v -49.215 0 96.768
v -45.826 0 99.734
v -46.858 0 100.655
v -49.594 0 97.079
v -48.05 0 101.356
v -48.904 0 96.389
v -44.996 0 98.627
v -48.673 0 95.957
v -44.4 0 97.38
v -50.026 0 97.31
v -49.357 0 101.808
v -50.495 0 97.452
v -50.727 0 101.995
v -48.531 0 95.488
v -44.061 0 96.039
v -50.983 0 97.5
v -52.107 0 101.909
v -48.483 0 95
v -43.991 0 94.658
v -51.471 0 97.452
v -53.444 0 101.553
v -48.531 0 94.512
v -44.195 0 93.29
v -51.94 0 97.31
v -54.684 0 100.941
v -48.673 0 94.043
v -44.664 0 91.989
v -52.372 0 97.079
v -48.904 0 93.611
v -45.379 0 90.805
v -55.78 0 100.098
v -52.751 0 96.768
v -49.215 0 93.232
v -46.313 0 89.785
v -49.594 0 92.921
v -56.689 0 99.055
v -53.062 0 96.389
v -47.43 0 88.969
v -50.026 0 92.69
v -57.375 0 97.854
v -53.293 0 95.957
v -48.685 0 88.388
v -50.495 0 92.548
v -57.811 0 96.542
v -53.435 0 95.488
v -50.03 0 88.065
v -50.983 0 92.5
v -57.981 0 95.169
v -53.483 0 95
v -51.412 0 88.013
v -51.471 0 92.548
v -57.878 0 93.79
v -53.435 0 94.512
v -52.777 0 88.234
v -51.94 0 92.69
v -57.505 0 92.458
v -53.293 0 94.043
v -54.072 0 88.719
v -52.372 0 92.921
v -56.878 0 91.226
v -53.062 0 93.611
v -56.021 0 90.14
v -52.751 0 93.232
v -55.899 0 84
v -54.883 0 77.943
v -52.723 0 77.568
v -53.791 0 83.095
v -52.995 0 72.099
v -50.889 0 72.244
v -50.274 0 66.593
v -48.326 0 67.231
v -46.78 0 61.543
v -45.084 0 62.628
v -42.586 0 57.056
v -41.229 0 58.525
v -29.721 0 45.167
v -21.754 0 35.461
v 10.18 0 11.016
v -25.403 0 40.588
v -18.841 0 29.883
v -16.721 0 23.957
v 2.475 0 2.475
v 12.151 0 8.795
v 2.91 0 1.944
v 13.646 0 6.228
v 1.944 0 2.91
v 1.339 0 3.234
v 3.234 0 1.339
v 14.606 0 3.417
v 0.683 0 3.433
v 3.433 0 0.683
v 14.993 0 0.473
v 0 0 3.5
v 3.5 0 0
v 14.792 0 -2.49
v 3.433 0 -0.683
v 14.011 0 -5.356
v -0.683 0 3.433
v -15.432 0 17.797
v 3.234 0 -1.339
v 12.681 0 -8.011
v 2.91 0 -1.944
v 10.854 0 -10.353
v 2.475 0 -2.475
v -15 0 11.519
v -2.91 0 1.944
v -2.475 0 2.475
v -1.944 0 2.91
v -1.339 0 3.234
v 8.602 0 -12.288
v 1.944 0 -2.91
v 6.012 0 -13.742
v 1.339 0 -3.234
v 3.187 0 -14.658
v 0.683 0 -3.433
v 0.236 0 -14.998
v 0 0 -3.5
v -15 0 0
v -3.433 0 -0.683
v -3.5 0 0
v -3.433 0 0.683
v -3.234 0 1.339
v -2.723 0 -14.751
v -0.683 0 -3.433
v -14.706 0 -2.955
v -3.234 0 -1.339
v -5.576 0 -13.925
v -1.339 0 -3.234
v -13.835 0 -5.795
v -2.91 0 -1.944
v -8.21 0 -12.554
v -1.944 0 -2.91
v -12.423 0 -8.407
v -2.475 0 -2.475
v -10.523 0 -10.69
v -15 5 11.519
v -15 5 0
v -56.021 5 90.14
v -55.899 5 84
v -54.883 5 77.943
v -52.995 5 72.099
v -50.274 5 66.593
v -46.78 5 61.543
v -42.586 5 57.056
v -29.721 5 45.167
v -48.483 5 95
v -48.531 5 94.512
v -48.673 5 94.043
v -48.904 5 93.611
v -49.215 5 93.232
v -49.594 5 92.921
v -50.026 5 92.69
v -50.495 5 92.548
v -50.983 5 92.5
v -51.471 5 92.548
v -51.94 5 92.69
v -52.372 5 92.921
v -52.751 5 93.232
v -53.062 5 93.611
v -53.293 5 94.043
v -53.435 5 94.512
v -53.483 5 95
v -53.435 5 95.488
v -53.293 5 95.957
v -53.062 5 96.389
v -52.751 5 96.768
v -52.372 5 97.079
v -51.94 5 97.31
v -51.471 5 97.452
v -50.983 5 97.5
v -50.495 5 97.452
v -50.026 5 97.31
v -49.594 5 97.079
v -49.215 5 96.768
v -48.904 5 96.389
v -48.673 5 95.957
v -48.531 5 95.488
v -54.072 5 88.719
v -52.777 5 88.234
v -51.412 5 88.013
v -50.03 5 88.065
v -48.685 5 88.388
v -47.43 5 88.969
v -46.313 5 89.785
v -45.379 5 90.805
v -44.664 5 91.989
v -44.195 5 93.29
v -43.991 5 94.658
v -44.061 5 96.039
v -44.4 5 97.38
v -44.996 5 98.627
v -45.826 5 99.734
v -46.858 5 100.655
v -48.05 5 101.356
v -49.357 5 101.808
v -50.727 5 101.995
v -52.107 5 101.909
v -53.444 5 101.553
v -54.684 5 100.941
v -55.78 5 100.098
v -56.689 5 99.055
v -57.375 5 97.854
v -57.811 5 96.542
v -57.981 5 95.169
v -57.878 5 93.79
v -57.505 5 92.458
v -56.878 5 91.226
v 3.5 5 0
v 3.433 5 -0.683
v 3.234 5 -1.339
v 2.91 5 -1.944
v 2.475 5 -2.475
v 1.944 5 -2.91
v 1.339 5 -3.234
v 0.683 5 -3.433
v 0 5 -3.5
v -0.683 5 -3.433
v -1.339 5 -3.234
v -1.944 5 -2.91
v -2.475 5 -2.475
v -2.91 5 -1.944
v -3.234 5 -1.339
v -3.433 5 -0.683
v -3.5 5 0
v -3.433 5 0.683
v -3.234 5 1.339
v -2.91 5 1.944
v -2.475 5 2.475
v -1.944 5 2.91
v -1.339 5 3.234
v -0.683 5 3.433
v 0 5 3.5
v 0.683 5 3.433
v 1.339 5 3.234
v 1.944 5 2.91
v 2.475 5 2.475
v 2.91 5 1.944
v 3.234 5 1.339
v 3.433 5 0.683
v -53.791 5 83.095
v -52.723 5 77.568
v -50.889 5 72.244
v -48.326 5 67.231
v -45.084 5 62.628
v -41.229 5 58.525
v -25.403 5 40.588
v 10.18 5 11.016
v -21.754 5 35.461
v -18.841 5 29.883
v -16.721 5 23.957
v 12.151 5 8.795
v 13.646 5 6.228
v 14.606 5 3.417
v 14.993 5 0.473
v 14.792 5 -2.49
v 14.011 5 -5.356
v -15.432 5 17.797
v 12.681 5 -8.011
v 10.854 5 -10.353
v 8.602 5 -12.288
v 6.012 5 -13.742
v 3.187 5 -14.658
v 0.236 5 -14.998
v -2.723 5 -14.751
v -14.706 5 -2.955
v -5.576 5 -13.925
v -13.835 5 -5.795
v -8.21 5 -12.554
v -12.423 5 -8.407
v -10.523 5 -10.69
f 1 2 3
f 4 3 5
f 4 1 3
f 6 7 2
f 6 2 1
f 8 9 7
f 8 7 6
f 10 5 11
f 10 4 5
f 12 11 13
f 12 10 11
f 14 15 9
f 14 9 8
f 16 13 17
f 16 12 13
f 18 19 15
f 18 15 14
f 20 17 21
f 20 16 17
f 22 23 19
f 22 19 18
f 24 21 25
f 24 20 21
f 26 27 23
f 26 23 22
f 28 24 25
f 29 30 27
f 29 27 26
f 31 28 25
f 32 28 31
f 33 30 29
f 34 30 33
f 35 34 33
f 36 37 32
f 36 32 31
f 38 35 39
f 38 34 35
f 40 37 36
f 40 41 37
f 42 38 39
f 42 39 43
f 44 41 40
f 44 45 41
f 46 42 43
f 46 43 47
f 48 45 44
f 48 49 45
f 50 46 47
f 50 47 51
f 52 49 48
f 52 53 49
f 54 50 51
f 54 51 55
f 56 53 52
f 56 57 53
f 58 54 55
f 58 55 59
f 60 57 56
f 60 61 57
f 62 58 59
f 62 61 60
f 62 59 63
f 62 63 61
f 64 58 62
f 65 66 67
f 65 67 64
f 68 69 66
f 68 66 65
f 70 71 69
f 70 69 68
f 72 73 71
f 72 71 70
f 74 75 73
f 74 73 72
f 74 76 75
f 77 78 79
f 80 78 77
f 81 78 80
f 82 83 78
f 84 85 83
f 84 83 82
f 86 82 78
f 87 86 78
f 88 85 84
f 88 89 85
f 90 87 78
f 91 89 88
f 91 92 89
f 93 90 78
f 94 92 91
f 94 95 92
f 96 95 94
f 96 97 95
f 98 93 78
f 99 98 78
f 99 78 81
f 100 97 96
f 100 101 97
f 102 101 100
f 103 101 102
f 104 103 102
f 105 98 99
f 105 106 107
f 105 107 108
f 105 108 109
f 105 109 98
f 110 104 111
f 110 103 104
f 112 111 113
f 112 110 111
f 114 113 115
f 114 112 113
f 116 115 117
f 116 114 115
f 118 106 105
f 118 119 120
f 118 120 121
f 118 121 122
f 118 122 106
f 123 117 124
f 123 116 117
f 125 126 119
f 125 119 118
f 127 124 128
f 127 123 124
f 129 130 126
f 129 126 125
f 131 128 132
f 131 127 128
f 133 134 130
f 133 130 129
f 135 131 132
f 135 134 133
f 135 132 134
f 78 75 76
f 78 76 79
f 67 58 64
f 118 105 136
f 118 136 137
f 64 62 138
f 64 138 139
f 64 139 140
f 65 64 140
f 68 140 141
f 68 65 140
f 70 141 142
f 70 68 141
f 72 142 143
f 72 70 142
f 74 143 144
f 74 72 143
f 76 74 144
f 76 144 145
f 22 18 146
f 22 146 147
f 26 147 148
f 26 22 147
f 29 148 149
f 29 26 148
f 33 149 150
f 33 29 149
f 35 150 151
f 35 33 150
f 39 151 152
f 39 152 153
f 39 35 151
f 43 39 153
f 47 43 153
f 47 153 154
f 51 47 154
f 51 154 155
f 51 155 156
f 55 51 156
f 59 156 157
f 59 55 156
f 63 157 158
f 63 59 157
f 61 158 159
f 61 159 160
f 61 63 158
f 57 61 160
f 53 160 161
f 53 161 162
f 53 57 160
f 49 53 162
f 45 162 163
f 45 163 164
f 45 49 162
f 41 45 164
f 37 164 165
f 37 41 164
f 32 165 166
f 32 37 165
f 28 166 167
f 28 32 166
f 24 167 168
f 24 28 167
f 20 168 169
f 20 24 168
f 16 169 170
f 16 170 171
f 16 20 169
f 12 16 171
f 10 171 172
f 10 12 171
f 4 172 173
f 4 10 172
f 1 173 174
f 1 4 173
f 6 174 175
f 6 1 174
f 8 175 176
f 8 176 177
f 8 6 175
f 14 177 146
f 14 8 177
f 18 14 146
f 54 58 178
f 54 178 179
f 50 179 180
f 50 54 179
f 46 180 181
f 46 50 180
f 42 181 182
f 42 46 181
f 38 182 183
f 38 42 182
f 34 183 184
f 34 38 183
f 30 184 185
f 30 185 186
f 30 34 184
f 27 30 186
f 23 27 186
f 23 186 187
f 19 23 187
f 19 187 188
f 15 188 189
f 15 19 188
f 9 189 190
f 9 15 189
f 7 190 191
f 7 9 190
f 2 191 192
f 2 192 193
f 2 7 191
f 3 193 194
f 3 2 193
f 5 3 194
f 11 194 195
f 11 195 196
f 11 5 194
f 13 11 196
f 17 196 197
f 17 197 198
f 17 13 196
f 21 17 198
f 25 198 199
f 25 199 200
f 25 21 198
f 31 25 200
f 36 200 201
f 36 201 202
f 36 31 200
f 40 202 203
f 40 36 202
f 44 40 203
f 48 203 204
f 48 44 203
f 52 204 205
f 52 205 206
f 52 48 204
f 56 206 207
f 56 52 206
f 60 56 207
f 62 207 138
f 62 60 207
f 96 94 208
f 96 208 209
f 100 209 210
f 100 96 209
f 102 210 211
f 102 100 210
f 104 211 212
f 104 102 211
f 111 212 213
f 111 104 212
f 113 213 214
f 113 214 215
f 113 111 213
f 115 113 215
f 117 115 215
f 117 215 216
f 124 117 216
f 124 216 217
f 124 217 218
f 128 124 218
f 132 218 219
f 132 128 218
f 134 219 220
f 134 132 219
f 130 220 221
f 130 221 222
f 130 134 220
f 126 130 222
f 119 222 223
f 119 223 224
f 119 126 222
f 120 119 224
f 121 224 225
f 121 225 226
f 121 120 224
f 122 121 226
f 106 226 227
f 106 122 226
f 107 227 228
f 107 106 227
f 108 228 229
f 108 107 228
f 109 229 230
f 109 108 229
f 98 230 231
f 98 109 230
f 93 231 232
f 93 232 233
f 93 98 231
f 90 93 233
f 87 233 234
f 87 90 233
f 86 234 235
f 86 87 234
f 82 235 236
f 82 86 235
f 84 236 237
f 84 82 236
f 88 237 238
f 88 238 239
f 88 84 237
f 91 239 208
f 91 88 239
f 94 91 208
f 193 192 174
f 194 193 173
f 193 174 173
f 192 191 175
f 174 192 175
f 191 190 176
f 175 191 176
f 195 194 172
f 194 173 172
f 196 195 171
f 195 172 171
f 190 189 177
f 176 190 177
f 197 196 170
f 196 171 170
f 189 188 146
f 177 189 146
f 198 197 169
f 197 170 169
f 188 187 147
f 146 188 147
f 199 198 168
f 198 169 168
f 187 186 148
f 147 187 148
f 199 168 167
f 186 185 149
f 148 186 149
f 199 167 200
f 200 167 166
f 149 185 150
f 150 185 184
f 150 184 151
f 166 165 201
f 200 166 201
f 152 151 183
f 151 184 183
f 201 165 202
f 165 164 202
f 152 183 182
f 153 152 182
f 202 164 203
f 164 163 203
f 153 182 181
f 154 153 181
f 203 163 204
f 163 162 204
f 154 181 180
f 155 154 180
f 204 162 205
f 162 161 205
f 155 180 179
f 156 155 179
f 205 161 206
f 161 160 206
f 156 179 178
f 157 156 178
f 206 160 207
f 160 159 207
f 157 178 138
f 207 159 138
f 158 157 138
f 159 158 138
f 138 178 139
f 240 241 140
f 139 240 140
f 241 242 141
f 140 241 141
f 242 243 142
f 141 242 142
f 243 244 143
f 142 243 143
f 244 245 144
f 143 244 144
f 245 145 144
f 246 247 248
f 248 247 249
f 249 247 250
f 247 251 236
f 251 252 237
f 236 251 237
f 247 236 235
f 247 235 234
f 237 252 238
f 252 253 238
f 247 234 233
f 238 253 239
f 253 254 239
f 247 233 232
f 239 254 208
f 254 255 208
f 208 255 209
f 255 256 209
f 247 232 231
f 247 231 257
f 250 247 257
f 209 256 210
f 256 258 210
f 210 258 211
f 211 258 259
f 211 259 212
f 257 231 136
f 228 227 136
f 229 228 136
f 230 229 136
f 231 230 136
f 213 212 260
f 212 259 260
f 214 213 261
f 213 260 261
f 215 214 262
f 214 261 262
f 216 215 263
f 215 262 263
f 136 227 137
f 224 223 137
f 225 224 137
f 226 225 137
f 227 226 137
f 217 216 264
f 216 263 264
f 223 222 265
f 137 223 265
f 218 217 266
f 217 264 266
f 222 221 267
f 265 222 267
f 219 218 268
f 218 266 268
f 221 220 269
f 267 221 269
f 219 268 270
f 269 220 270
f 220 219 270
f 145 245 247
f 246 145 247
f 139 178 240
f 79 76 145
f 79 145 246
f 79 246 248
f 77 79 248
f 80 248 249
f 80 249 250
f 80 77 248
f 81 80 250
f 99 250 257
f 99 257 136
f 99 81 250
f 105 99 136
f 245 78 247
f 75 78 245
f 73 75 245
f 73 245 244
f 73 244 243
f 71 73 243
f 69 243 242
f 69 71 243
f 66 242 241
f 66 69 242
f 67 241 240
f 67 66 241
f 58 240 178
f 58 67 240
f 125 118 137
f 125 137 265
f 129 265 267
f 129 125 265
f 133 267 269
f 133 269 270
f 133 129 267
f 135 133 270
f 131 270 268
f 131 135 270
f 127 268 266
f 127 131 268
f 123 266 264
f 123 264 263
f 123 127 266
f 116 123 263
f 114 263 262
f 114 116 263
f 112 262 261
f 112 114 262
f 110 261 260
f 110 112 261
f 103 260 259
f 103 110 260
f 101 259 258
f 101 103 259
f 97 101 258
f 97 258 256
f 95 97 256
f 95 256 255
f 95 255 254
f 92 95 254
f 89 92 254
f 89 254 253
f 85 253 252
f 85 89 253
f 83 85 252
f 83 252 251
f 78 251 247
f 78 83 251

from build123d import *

# Parameters (mm, degrees)
ESQUISSE1_R      = 3.5
ESQUISSE1_R_2    = 2.5
EXTRUSION1_DEPTH = 5


with BuildPart() as part:
    # Esquisse1 → Extrusion1 (new body)
    with BuildSketch(Plane(origin=(0, 0, 0), x_dir=(1, 0, 0), z_dir=(0, 1, 0))):
        with BuildLine():
            Line((10.180478804, -11.016253961), (-41.228706345, -58.525155046))
            ThreePointArc((-41.228706345, -58.525155046), (-50.88895895, -72.244351595), (-54.072422177, -88.71864661))
            ThreePointArc((-54.072422177, -88.71864661), (-46.857537983, -100.655144285), (-56.021074344, -90.140196256))
            ThreePointArc((-56.021074344, -90.140196256), (-52.994554425, -72.099401237), (-42.586103519, -57.056321184))
            Line((-42.586103519, -57.056321184), (-29.72073238, -45.167013017))
            ThreePointArc((-29.72073238, -45.167013017), (-18.841206309, -29.882608736), (-15, -11.518997003))
            Line((-15, -11.518997003), (-15, 0))
            ThreePointArc((-15, 0), (6.012188368, 13.74240121), (10.180478804, -11.016253961))
        make_face()
        Circle(ESQUISSE1_R, mode=Mode.SUBTRACT)
        with Locations((-50.982988639, -95)):
            Circle(ESQUISSE1_R_2, mode=Mode.SUBTRACT)
    extrude(amount=EXTRUSION1_DEPTH)


solid = part.part
